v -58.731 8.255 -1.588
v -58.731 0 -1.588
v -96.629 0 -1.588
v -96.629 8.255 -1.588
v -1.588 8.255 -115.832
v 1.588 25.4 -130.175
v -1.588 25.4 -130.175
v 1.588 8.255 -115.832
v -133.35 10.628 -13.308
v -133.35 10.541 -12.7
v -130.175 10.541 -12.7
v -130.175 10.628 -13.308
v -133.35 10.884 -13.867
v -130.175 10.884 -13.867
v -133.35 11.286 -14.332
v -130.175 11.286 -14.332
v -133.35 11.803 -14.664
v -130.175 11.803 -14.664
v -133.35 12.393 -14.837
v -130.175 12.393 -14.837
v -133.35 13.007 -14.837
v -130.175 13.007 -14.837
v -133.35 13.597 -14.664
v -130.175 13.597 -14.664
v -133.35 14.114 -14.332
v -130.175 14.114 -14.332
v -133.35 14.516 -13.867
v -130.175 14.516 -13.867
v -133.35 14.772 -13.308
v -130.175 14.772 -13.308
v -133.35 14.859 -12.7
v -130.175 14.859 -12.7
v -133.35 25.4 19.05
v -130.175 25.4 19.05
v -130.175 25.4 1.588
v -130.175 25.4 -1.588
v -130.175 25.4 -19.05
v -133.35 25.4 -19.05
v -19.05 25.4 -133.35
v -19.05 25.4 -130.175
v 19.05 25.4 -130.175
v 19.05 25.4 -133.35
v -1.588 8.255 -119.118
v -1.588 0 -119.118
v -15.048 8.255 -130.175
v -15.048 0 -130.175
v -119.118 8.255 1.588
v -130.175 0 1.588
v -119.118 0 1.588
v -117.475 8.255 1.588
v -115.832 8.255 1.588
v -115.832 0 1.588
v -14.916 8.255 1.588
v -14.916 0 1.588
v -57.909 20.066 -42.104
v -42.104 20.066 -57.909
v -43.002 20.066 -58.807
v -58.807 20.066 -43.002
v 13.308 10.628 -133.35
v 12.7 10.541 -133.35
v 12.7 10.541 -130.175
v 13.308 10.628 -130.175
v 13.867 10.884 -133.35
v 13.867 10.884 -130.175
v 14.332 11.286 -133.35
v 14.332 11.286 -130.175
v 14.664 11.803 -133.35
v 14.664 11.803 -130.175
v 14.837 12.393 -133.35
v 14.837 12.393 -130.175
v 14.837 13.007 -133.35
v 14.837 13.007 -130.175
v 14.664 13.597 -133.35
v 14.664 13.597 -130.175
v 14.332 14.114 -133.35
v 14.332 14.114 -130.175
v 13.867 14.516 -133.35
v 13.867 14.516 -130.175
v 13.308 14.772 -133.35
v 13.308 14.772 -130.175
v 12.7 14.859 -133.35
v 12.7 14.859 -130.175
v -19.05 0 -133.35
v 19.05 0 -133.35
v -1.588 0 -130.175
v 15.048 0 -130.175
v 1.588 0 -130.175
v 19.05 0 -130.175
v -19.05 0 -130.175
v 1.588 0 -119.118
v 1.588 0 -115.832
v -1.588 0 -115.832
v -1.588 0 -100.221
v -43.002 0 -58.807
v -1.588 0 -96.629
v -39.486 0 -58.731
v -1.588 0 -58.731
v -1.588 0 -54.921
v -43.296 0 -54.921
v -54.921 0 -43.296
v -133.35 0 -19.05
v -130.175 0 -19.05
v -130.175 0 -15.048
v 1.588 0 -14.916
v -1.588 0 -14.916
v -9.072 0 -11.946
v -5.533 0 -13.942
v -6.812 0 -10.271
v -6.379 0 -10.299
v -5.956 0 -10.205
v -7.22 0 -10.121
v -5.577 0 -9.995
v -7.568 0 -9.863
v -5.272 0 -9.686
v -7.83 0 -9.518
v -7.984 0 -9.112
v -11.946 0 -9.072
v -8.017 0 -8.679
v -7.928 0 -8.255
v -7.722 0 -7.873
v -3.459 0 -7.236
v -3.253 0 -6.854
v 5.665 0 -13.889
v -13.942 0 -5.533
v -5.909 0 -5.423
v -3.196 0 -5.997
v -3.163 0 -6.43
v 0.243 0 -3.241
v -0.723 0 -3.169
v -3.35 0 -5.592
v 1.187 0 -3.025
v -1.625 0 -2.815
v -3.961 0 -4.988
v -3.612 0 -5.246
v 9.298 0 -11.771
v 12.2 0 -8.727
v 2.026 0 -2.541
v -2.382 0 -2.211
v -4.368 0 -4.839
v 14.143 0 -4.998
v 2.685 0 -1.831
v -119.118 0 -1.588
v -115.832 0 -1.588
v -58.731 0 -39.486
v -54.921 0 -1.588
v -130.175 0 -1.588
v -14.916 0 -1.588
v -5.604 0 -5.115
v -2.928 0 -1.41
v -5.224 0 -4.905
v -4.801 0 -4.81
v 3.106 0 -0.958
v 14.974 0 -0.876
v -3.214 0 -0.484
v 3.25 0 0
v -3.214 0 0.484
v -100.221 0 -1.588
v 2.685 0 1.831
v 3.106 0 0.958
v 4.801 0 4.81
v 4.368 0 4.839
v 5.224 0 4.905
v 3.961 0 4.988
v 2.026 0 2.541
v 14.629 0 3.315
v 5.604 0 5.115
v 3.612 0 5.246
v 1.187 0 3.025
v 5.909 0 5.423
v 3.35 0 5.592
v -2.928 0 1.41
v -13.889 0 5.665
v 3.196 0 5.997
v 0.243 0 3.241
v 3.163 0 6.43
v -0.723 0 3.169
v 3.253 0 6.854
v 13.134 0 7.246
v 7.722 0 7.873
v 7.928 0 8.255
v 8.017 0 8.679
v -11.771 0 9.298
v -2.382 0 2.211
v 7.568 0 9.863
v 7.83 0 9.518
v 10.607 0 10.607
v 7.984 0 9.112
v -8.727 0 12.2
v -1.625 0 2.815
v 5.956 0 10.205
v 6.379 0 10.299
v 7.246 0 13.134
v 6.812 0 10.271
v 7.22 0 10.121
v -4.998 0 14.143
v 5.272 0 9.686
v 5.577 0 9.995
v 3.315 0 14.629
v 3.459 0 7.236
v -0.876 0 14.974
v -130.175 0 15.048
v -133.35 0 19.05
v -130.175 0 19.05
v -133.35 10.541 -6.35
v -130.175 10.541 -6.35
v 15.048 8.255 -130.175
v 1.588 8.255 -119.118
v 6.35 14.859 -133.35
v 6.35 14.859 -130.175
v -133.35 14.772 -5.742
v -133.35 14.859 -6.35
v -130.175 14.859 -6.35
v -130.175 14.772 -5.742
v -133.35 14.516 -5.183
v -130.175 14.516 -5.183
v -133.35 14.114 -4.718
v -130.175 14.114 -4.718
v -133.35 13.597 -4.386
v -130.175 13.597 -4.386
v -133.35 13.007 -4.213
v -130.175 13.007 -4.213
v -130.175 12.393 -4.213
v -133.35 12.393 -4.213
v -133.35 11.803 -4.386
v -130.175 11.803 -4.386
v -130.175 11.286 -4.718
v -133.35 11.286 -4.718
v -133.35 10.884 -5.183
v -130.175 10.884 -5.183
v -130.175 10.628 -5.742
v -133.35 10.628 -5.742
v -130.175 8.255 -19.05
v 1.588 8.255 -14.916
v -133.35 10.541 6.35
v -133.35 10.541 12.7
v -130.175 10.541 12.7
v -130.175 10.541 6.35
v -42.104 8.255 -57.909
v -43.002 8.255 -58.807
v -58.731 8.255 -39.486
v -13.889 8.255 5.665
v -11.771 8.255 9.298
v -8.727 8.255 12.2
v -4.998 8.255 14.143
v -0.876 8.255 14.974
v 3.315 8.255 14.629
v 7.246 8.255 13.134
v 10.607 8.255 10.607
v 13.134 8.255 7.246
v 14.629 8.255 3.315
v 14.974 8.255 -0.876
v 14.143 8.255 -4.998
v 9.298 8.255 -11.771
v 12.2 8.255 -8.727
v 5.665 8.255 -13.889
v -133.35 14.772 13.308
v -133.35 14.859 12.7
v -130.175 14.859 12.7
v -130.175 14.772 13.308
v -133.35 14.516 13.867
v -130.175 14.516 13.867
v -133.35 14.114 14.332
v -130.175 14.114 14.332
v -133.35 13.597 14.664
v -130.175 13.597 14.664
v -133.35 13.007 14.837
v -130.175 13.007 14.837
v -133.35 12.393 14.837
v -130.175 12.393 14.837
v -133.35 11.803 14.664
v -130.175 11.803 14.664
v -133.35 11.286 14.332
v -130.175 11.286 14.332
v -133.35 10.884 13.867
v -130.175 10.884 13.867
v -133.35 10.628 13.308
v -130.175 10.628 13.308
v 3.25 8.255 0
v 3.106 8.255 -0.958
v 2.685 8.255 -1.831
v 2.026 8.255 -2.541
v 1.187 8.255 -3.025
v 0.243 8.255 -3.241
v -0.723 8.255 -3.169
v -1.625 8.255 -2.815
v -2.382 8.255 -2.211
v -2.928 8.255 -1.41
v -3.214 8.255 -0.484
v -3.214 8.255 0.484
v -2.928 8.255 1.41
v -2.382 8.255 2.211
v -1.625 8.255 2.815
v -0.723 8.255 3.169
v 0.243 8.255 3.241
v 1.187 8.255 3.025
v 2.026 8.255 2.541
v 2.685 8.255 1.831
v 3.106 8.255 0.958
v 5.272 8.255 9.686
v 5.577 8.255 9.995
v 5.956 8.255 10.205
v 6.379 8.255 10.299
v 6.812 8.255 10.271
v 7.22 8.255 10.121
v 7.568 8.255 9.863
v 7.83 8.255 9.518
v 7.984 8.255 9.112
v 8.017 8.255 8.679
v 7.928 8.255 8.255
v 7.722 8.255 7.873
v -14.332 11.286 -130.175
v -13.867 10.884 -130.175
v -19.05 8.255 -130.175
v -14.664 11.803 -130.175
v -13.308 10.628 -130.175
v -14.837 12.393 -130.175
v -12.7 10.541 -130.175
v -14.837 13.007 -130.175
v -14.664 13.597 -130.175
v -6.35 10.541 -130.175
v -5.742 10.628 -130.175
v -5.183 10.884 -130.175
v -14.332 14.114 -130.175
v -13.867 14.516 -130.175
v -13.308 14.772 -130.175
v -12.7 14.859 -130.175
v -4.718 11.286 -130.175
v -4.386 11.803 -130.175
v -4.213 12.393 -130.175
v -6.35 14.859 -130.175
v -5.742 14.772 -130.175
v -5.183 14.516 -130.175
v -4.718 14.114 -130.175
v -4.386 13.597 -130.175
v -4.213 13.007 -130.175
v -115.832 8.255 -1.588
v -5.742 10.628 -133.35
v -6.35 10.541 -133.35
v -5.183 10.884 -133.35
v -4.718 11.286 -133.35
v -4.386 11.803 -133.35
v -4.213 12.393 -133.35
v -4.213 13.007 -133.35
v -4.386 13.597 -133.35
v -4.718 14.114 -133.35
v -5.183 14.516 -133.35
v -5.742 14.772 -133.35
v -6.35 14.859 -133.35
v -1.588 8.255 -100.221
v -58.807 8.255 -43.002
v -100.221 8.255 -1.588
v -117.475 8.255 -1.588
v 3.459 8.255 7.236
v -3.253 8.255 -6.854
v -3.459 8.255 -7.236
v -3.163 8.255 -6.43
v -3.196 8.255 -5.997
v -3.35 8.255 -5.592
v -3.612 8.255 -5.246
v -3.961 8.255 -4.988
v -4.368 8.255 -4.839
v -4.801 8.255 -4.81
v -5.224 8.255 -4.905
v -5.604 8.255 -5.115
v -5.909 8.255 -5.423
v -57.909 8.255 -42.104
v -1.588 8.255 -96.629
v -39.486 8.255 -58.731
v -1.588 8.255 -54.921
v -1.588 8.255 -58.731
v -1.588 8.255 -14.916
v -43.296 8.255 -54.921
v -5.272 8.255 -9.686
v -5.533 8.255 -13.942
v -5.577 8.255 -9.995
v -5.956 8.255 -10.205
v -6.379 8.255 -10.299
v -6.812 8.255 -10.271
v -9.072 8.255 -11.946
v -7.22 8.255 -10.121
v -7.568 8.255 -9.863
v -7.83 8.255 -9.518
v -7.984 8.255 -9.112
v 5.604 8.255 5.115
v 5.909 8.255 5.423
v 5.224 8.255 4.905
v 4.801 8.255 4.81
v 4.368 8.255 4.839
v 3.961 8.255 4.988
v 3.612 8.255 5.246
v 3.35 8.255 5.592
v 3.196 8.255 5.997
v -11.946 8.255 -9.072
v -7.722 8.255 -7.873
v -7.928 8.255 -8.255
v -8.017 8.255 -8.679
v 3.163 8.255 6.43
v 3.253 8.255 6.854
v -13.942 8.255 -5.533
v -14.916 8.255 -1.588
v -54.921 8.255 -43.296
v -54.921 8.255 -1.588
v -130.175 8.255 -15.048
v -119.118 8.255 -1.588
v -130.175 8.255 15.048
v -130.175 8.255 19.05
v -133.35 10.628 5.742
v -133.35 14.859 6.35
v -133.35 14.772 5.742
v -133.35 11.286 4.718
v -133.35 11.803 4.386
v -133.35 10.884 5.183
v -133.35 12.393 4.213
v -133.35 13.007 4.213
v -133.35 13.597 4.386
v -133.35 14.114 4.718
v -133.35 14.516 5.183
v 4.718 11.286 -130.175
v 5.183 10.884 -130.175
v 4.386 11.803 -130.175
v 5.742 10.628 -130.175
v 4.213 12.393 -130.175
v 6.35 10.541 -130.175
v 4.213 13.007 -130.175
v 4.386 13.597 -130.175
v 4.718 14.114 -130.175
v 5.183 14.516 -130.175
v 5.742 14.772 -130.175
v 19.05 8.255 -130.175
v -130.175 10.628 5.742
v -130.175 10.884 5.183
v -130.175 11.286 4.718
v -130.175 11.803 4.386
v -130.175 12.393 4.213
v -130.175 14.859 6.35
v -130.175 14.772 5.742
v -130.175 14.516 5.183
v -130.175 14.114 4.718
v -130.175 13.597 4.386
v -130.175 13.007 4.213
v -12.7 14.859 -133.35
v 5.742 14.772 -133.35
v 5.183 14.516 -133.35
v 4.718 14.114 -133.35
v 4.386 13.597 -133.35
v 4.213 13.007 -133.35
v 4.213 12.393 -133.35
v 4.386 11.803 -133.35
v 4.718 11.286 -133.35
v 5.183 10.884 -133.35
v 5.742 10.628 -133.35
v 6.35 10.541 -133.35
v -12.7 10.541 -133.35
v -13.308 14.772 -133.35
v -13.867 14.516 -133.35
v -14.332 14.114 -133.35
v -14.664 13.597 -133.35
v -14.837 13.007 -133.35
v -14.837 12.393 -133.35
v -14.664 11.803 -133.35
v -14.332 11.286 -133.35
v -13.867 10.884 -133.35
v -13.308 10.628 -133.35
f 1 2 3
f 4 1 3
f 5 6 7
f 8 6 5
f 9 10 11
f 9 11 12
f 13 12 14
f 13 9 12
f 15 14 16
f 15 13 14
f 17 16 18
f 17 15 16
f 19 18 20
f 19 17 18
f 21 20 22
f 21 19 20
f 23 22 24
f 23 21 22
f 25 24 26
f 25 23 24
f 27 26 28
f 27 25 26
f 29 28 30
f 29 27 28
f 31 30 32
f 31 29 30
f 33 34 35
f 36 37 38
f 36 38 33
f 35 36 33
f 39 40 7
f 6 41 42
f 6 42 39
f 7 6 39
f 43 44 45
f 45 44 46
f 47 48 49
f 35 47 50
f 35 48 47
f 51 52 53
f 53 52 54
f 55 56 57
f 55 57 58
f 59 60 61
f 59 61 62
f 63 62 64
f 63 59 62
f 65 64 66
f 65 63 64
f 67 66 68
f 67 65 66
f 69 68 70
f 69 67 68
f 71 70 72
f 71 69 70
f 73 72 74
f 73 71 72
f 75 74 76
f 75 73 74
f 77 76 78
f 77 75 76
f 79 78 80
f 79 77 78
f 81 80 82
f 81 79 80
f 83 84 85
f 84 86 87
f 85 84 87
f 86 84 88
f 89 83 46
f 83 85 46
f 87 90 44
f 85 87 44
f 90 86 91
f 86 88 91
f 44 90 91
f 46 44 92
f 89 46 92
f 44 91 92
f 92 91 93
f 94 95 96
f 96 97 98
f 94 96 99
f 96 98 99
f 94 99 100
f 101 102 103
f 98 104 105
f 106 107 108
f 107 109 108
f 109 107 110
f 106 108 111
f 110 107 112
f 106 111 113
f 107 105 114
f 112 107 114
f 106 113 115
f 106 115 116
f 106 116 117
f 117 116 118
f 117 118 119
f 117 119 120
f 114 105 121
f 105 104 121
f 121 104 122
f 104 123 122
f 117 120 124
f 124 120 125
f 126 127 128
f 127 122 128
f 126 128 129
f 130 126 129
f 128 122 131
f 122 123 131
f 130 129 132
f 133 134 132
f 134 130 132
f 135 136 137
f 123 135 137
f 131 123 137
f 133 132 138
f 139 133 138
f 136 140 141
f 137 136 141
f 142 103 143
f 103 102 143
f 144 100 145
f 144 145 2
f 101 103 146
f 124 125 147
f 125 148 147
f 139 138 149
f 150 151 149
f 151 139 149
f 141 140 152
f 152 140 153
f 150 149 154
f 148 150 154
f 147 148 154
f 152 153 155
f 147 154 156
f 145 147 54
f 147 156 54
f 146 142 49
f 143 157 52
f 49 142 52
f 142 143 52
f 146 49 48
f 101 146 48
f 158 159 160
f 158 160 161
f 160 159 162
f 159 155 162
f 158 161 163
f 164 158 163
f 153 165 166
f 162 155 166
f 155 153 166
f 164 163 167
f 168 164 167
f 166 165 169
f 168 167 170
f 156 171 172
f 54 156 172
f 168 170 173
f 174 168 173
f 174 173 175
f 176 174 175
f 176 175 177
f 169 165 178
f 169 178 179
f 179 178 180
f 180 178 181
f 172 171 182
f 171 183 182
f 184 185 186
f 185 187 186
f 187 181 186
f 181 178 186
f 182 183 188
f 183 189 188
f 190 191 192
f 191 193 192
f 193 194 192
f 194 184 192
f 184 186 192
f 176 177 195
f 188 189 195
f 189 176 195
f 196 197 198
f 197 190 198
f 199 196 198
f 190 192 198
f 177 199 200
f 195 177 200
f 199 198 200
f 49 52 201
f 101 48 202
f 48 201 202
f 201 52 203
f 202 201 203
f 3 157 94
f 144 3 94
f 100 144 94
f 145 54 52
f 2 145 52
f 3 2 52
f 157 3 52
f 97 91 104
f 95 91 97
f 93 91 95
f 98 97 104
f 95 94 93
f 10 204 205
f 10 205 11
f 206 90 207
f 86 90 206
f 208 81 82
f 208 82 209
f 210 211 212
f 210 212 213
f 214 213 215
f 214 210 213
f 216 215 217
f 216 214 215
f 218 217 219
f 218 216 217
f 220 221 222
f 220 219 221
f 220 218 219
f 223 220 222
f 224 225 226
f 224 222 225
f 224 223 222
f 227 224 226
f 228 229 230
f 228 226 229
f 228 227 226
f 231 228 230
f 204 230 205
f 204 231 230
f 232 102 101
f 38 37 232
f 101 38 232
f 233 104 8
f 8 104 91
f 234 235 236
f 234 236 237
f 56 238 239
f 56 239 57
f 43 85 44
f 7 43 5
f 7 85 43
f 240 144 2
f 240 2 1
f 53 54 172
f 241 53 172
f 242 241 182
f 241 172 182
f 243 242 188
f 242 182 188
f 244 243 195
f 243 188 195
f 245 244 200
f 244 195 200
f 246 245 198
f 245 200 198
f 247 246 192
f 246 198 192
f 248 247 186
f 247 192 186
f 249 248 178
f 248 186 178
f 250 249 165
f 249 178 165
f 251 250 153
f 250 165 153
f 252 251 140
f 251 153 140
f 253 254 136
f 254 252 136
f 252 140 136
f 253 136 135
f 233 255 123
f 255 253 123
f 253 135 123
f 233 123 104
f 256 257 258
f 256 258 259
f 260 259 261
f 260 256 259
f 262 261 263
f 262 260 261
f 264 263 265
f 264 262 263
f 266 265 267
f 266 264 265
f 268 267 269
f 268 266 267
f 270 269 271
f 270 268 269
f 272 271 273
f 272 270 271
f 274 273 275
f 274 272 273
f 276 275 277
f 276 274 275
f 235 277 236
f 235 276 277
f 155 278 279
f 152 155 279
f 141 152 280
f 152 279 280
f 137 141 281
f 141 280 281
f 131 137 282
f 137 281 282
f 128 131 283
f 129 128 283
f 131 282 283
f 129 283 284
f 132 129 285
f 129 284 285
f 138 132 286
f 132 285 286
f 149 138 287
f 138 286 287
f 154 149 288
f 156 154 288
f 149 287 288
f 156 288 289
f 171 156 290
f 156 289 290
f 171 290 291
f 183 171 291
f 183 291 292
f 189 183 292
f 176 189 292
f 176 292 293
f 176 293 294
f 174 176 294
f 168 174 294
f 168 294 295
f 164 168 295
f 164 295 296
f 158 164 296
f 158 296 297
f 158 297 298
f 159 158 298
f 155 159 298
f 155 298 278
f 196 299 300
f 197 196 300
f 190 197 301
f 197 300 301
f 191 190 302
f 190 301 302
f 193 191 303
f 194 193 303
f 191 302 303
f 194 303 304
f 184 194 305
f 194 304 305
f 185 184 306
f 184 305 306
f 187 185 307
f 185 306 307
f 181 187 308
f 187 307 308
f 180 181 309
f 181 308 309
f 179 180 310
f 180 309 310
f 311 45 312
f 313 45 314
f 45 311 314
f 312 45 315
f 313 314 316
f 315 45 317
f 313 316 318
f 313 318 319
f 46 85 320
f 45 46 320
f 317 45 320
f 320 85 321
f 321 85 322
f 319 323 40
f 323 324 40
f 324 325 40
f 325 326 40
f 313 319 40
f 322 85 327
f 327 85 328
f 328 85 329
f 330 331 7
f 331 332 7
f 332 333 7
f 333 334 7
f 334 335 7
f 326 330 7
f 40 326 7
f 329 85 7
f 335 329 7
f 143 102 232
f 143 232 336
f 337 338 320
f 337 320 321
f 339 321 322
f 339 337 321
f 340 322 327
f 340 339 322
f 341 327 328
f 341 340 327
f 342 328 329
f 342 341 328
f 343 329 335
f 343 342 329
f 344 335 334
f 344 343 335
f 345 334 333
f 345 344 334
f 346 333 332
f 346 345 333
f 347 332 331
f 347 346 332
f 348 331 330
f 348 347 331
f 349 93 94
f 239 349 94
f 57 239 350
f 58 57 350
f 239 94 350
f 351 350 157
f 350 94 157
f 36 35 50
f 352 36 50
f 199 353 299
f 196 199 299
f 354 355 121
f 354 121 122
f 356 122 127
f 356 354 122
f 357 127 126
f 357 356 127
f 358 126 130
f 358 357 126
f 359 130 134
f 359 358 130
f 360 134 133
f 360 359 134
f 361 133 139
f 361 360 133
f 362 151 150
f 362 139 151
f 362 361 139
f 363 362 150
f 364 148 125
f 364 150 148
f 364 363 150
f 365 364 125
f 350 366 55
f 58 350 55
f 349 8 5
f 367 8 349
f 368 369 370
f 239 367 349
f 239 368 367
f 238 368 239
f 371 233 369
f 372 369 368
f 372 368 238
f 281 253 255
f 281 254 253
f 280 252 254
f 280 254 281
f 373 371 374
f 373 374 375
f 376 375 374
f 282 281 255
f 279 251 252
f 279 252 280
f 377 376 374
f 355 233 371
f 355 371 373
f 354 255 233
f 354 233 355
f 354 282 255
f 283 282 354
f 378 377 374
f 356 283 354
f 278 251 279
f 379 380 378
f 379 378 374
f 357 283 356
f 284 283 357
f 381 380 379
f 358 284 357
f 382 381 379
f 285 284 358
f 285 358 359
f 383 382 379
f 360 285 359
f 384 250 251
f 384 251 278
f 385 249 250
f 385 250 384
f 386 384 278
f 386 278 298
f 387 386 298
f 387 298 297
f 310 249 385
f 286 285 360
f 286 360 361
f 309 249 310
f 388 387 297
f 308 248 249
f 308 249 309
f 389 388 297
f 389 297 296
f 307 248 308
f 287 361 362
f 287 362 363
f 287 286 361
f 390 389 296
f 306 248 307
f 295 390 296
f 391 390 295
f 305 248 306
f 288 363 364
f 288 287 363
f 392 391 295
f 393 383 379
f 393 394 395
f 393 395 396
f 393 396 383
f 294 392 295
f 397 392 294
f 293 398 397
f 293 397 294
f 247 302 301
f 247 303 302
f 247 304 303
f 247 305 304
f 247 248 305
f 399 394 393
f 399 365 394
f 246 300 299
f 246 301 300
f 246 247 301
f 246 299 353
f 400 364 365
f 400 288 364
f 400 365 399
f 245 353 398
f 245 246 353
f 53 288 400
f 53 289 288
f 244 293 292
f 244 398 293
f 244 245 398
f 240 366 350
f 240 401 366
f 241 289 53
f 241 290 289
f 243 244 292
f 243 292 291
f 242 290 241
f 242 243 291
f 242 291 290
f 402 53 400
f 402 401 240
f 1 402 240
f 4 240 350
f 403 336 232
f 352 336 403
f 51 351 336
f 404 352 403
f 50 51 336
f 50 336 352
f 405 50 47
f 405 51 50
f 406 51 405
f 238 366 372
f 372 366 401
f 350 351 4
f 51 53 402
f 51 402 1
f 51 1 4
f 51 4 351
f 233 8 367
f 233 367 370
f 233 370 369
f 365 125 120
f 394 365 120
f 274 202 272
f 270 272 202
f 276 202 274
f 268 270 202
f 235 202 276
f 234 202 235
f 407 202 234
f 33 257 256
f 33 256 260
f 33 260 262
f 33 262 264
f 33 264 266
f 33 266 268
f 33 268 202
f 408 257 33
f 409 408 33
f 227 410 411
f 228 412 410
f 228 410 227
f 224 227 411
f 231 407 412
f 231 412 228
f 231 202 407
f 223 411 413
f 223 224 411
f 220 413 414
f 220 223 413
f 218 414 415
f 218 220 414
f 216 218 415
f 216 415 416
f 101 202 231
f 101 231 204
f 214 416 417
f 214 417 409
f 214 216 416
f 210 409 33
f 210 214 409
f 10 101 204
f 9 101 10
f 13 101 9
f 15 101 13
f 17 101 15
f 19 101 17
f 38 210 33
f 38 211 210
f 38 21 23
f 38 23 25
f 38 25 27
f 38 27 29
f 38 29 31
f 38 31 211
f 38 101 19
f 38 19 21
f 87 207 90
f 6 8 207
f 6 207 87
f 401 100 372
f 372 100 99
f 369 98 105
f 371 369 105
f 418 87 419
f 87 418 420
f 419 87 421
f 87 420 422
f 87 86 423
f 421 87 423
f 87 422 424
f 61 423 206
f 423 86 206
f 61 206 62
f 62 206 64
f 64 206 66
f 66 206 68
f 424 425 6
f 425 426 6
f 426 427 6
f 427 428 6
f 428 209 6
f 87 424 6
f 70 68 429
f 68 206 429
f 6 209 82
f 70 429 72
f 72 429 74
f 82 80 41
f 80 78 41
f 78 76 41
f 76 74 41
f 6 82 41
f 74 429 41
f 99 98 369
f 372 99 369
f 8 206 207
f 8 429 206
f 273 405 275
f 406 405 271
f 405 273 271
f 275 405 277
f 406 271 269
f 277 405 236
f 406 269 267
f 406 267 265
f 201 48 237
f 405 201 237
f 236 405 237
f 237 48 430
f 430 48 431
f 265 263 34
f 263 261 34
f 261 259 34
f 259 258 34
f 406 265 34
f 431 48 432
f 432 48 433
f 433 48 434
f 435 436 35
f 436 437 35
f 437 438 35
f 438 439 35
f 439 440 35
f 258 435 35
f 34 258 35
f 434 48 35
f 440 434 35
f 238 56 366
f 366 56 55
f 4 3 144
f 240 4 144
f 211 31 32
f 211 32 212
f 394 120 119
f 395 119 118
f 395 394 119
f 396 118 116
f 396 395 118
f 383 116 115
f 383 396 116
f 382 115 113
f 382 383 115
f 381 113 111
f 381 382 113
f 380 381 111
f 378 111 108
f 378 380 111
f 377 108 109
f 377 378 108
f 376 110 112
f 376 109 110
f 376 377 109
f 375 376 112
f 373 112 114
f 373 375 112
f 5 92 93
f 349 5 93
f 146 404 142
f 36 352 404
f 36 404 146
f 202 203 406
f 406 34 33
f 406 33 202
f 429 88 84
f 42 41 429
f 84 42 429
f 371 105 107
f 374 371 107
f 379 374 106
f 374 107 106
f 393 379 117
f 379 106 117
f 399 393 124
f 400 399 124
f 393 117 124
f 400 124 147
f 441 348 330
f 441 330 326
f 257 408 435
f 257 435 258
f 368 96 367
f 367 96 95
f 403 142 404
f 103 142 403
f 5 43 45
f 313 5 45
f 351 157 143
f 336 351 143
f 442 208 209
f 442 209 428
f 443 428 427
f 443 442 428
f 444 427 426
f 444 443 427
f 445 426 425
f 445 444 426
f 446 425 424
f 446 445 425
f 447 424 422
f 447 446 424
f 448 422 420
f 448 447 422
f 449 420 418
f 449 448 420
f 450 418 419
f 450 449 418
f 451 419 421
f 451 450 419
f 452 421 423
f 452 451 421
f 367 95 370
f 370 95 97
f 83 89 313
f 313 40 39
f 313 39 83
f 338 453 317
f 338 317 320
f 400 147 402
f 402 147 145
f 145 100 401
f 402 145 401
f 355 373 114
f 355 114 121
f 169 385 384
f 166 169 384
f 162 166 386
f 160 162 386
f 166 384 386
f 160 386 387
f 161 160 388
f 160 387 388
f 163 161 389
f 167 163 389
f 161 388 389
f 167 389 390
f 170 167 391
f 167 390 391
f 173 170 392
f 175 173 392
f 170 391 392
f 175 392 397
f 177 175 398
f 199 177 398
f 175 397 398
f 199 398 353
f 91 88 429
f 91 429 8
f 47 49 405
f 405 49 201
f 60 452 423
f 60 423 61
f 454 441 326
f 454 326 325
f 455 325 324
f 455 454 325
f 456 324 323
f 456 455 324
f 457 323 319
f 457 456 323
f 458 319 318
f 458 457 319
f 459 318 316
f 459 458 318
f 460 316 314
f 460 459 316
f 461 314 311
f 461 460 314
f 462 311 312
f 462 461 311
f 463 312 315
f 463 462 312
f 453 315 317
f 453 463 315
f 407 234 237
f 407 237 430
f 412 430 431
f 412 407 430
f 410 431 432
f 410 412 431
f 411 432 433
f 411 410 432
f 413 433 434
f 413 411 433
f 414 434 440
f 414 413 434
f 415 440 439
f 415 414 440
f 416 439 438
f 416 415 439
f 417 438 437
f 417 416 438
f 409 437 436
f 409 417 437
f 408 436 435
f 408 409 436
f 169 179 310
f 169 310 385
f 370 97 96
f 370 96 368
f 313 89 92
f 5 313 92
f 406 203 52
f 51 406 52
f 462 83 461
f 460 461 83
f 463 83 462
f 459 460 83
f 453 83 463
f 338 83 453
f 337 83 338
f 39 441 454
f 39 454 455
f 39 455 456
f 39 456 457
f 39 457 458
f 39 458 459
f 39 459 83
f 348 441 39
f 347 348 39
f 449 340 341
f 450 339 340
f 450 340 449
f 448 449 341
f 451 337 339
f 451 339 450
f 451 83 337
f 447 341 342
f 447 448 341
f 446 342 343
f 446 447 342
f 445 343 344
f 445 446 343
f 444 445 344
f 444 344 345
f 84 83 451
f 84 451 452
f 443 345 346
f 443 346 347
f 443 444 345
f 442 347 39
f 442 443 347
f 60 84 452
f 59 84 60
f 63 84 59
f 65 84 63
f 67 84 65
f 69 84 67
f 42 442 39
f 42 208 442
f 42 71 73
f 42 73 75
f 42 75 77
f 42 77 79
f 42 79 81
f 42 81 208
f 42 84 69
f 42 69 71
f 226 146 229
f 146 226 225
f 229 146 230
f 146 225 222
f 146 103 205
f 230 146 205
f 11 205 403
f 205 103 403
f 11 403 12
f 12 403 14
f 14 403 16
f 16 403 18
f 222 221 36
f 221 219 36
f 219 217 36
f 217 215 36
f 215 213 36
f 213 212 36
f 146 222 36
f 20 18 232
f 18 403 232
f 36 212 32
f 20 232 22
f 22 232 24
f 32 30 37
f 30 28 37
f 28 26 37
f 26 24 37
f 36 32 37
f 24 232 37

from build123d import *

# Parameters (mm, degrees)
SKETCH1_R                       = 15
BOSS_EXTRUDE2_DEPTH             = 8.255
BOSS_EXTRUDE3_DEPTH             = 8.255
SKETCH5_R                       = 3.249999977
CUT_EXTRUDE3_DEPTH              = 63.5
SKETCH7_W                       = 3.175
SKETCH7_H                       = 25.4
BOSS_EXTRUDE5_DEPTH             = 19.05
CUT_EXTRUDE6_DEPTH              = 149.35
CIRPATTERN2_COUNT               = 2
CIRPATTERN2_ANGLE               = 90
CIRPATTERN3_COUNT               = 2
CIRPATTERN3_ANGLE               = 90
BOSS_EXTRUDE6_DEPTH             = 8.255
BOSS_EXTRUDE7_REACH             = 21.05
BOSS_EXTRUDE7_DIRECTION_2_REACH = 135.35
BOSS_EXTRUDE8_REACH             = 21.05
BOSS_EXTRUDE8_DIRECTION_2_REACH = 135.35
BOSS_EXTRUDE9_REACH             = 133.763
SKETCH19_W                      = 3.81
SKETCH19_H                      = 8.255
BOSS_EXTRUDE10_REACH            = 133.763
SKETCH20_W                      = 3.81
SKETCH20_H                      = 8.255
SKETCH21_W                      = 22.352
SKETCH21_H                      = 20.066
BOSS_EXTRUDE11_DEPTH            = 1.27


with BuildPart() as part:
    # Sketch1 → Boss-Extrude2 (new body)
    with BuildSketch(Plane(origin=(0, 0, 0), x_dir=(1, 0, 0), z_dir=(0, 1, 0))):
        Circle(SKETCH1_R)
    extrude(amount=BOSS_EXTRUDE2_DEPTH)

    # Sketch1<6> → Boss-Extrude3 (add)
    with BuildSketch(Plane(origin=(0, 0, 0), x_dir=(1, 0, 0), z_dir=(0, 1, 0))):
        with BuildLine():
            Line((-1.5875, 130.175), (-1.5875, 14.915758236))
            ThreePointArc((-1.5875, 14.915758236), (0, 15), (1.5875, 14.915758236))
            Line((1.5875, 14.915758236), (1.5875, 130.175))
            Line((1.5875, 130.175), (-1.5875, 130.175))
        make_face()
        with BuildLine():
            ThreePointArc((-14.915758236, -1.5875), (-15, 0), (-14.915758236, 1.5875))
            Line((-14.915758236, 1.5875), (-130.175, 1.5875))
            Line((-130.175, 1.5875), (-130.175, -1.5875))
            Line((-130.175, -1.5875), (-14.915758236, -1.5875))
        make_face()
    extrude(amount=BOSS_EXTRUDE3_DEPTH)

    # Sketch5 → Cut-Extrude3 (cut)
    with BuildSketch(Plane(origin=(0, 8.255, 0), x_dir=(1, 0, 0), z_dir=(0, 1, 0))):
        Circle(SKETCH5_R)
        with BuildLine():
            Line((-5.908712478, 5.423058993), (-7.721732332, 7.873214705))
            ThreePointArc((-7.721732332, 7.873214705), (-7.403164404, 10.004802487), (-5.271576621, 9.686234559))
            Line((-5.271576621, 9.686234559), (-3.458556767, 7.236078848))
            ThreePointArc((-3.458556767, 7.236078848), (-3.777124696, 5.104491065), (-5.908712478, 5.423058993))
        make_face()
        with BuildLine():
            Line((3.458556767, -7.236078848), (5.271576621, -9.686234559))
            ThreePointArc((5.271576621, -9.686234559), (7.403164404, -10.004802487), (7.721732332, -7.873214705))
            Line((7.721732332, -7.873214705), (5.908712478, -5.423058993))
            ThreePointArc((5.908712478, -5.423058993), (3.777124696, -5.104491065), (3.458556767, -7.236078848))
        make_face()
    extrude(amount=-CUT_EXTRUDE3_DEPTH, mode=Mode.SUBTRACT)

    # Sketch7 → Boss-Extrude5 (add, symmetric)
    with BuildSketch(Plane(origin=(0, 0, 0), x_dir=(0, 0, -1), z_dir=(1, 0, 0))):
        with Locations((131.7625, 12.7)):
            Rectangle(SKETCH7_W, SKETCH7_H)
    boss_extrude5 = extrude(amount=BOSS_EXTRUDE5_DEPTH, both=True)

    # Sketch12 → Cut-Extrude6 (cut, through all)
    with BuildSketch(Plane(origin=(0, 0, -133.35), x_dir=(-1, 0, 0), z_dir=(0, 0, -1))):
        with BuildLine():
            Line((-6.35, 10.541), (-12.7, 10.541))
            ThreePointArc((-12.7, 10.541), (-14.859, 12.7), (-12.7, 14.859))
            Line((-12.7, 14.859), (-6.35, 14.859))
            ThreePointArc((-6.35, 14.859), (-4.191, 12.7), (-6.35, 10.541))
        make_face()
        with BuildLine():
            Line((6.35, 14.859), (12.7, 14.859))
            ThreePointArc((12.7, 14.859), (14.859, 12.7), (12.7, 10.541))
            Line((12.7, 10.541), (6.35, 10.541))
            ThreePointArc((6.35, 10.541), (4.191, 12.7), (6.35, 14.859))
        make_face()
    cut_extrude6 = extrude(amount=-CUT_EXTRUDE6_DEPTH, mode=Mode.SUBTRACT)

    # CirPattern2: Boss-Extrude5 ×2 about axis
    cirpattern2_axis = Axis((0, 0, 0), (0, 1, 0))
    for i in range(1, CIRPATTERN2_COUNT):
        add(boss_extrude5.rotate(cirpattern2_axis, i * CIRPATTERN2_ANGLE / (CIRPATTERN2_COUNT - 1)))

    # CirPattern3: Cut-Extrude6 ×2 about axis
    cirpattern3_axis = Axis((0, 0, 0), (0, 1, 0))
    for i in range(1, CIRPATTERN3_COUNT):
        add(cut_extrude6.rotate(cirpattern3_axis, i * CIRPATTERN3_ANGLE / (CIRPATTERN3_COUNT - 1)), mode=Mode.SUBTRACT)

    # Sketch13 → Boss-Extrude6 (add)
    with BuildSketch(Plane.XZ):
        Polygon((-96.628948776, -1.5875), (-1.5875, -96.628948776), (-1.5875, -100.221051224), (-100.221051224, -1.5875), align=None)
        Polygon((-19.05, -130.175), (-1.5875, -115.831500599), (-1.5875, -119.118499401), (-15.048241783, -130.175), align=None)
        Polygon((19.05, -130.175), (1.5875, -115.831500599), (1.5875, -119.118499401), (15.048241783, -130.175), align=None)
        Polygon((-119.118499401, 1.5875), (-130.175, 15.048241783), (-130.175, 19.05), (-115.831500599, 1.5875), align=None)
        Polygon((-119.118499401, -1.5875), (-130.175, -15.048241783), (-130.175, -19.05), (-115.831500599, -1.5875), align=None)
    extrude(amount=-BOSS_EXTRUDE6_DEPTH)

    # Boss-Extrude7: up to this face of the body (flat: up to its plane)
    boss_extrude7_end = Plane(part.part.faces().sort_by_distance((-124.646749701, 4.1275, 1.5875))[0])
    # Sketch14 → Boss-Extrude7 (add, up to the picked face)
    with BuildSketch(Plane.XY, mode=Mode.PRIVATE) as boss_extrude7_sk1:
        Polygon((-130.175, 25.4), (-117.475, 8.255), (-130.175, 8.255), align=None)
    boss_extrude7_tool1 = split(extrude(boss_extrude7_sk1.sketch, amount=BOSS_EXTRUDE7_REACH, mode=Mode.PRIVATE), bisect_by=boss_extrude7_end, keep=Keep.BOTH, mode=Mode.PRIVATE)
    add(boss_extrude7_tool1.solids().sort_by_distance((-125.941667, 13.97, 0))[0])

    # Boss-Extrude7 direction 2: up to this face of the body (flat: up to its plane)
    boss_extrude7_direction_2_end = Plane(part.part.faces().sort_by_distance((-124.646749701, 4.1275, -1.5875))[0])
    # Sketch14 → Boss-Extrude7 direction 2 (add, up to the picked face)
    with BuildSketch(Plane.XY, mode=Mode.PRIVATE) as boss_extrude7_direction_2_sk1:
        Polygon((-130.175, 25.4), (-117.475, 8.255), (-130.175, 8.255), align=None)
    boss_extrude7_direction_2_tool1 = split(extrude(boss_extrude7_direction_2_sk1.sketch, amount=-BOSS_EXTRUDE7_DIRECTION_2_REACH, mode=Mode.PRIVATE), bisect_by=boss_extrude7_direction_2_end, keep=Keep.BOTH, mode=Mode.PRIVATE)
    add(boss_extrude7_direction_2_tool1.solids().sort_by_distance((-125.941667, 13.97, 0))[0])

    # Boss-Extrude8: up to this face of the body (flat: up to its plane)
    boss_extrude8_end = Plane(part.part.faces().sort_by_distance((1.5875, 4.1275, -65.373629417))[0])
    # Sketch15 → Boss-Extrude8 (add, up to the picked face)
    with BuildSketch(Plane(origin=(0, 0, 0), x_dir=(0, 0, -1), z_dir=(1, 0, 0)), mode=Mode.PRIVATE) as boss_extrude8_sk1:
        Polygon((130.175, 25.4), (115.831500599, 8.255), (130.175, 8.255), align=None)
    boss_extrude8_tool1 = split(extrude(boss_extrude8_sk1.sketch, amount=BOSS_EXTRUDE8_REACH, mode=Mode.PRIVATE), bisect_by=boss_extrude8_end, keep=Keep.BOTH, mode=Mode.PRIVATE)
    add(boss_extrude8_tool1.solids().sort_by_distance((0, 13.97, -125.393834))[0])

    # Boss-Extrude8 direction 2: up to this face of the body (flat: up to its plane)
    boss_extrude8_direction_2_end = Plane(part.part.faces().sort_by_distance((-1.5875, 4.1275, -108.026275912))[0])
    # Sketch15 → Boss-Extrude8 direction 2 (add, up to the picked face)
    with BuildSketch(Plane(origin=(0, 0, 0), x_dir=(0, 0, -1), z_dir=(1, 0, 0)), mode=Mode.PRIVATE) as boss_extrude8_direction_2_sk1:
        Polygon((130.175, 25.4), (115.831500599, 8.255), (130.175, 8.255), align=None)
    boss_extrude8_direction_2_tool1 = split(extrude(boss_extrude8_direction_2_sk1.sketch, amount=-BOSS_EXTRUDE8_DIRECTION_2_REACH, mode=Mode.PRIVATE), bisect_by=boss_extrude8_direction_2_end, keep=Keep.BOTH, mode=Mode.PRIVATE)
    add(boss_extrude8_direction_2_tool1.solids().sort_by_distance((0, 13.97, -125.393834))[0])

    # Sketch19 → Boss-Extrude9 (add, up to next)
    with BuildSketch(Plane.ZY.offset(1.5875), mode=Mode.PRIVATE) as boss_extrude9_sk1:
        with Locations((-56.825758236, 4.1275)):
            Rectangle(SKETCH19_W, SKETCH19_H)
    boss_extrude9_tool1 = extrude(boss_extrude9_sk1.sketch, amount=BOSS_EXTRUDE9_REACH, mode=Mode.PRIVATE) - part.part
    add(boss_extrude9_tool1.solids().sort_by_distance((-1.5875, 4.1275, -56.825758))[0])

    # Sketch20 → Boss-Extrude10 (add, up to next)
    with BuildSketch(Plane(origin=(0, 0, -1.5875), x_dir=(-1, 0, 0), z_dir=(0, 0, -1)), mode=Mode.PRIVATE) as boss_extrude10_sk1:
        with Locations((56.825758236, 4.1275)):
            Rectangle(SKETCH20_W, SKETCH20_H)
    boss_extrude10_tool1 = extrude(boss_extrude10_sk1.sketch, amount=BOSS_EXTRUDE10_REACH, mode=Mode.PRIVATE) - part.part
    add(boss_extrude10_tool1.solids().sort_by_distance((-56.825758, 4.1275, -1.5875))[0])

    # Sketch21 → Boss-Extrude11 (add)
    with BuildSketch(Plane(origin=(-50.00625, 0, -50.00625), x_dir=(-0.707106781, 0, 0.707106781), z_dir=(-0.707106781, 0, -0.707106781))):
        with Locations((0, 10.033)):
            Rectangle(SKETCH21_W, SKETCH21_H)
    extrude(amount=BOSS_EXTRUDE11_DEPTH)


solid = part.part
